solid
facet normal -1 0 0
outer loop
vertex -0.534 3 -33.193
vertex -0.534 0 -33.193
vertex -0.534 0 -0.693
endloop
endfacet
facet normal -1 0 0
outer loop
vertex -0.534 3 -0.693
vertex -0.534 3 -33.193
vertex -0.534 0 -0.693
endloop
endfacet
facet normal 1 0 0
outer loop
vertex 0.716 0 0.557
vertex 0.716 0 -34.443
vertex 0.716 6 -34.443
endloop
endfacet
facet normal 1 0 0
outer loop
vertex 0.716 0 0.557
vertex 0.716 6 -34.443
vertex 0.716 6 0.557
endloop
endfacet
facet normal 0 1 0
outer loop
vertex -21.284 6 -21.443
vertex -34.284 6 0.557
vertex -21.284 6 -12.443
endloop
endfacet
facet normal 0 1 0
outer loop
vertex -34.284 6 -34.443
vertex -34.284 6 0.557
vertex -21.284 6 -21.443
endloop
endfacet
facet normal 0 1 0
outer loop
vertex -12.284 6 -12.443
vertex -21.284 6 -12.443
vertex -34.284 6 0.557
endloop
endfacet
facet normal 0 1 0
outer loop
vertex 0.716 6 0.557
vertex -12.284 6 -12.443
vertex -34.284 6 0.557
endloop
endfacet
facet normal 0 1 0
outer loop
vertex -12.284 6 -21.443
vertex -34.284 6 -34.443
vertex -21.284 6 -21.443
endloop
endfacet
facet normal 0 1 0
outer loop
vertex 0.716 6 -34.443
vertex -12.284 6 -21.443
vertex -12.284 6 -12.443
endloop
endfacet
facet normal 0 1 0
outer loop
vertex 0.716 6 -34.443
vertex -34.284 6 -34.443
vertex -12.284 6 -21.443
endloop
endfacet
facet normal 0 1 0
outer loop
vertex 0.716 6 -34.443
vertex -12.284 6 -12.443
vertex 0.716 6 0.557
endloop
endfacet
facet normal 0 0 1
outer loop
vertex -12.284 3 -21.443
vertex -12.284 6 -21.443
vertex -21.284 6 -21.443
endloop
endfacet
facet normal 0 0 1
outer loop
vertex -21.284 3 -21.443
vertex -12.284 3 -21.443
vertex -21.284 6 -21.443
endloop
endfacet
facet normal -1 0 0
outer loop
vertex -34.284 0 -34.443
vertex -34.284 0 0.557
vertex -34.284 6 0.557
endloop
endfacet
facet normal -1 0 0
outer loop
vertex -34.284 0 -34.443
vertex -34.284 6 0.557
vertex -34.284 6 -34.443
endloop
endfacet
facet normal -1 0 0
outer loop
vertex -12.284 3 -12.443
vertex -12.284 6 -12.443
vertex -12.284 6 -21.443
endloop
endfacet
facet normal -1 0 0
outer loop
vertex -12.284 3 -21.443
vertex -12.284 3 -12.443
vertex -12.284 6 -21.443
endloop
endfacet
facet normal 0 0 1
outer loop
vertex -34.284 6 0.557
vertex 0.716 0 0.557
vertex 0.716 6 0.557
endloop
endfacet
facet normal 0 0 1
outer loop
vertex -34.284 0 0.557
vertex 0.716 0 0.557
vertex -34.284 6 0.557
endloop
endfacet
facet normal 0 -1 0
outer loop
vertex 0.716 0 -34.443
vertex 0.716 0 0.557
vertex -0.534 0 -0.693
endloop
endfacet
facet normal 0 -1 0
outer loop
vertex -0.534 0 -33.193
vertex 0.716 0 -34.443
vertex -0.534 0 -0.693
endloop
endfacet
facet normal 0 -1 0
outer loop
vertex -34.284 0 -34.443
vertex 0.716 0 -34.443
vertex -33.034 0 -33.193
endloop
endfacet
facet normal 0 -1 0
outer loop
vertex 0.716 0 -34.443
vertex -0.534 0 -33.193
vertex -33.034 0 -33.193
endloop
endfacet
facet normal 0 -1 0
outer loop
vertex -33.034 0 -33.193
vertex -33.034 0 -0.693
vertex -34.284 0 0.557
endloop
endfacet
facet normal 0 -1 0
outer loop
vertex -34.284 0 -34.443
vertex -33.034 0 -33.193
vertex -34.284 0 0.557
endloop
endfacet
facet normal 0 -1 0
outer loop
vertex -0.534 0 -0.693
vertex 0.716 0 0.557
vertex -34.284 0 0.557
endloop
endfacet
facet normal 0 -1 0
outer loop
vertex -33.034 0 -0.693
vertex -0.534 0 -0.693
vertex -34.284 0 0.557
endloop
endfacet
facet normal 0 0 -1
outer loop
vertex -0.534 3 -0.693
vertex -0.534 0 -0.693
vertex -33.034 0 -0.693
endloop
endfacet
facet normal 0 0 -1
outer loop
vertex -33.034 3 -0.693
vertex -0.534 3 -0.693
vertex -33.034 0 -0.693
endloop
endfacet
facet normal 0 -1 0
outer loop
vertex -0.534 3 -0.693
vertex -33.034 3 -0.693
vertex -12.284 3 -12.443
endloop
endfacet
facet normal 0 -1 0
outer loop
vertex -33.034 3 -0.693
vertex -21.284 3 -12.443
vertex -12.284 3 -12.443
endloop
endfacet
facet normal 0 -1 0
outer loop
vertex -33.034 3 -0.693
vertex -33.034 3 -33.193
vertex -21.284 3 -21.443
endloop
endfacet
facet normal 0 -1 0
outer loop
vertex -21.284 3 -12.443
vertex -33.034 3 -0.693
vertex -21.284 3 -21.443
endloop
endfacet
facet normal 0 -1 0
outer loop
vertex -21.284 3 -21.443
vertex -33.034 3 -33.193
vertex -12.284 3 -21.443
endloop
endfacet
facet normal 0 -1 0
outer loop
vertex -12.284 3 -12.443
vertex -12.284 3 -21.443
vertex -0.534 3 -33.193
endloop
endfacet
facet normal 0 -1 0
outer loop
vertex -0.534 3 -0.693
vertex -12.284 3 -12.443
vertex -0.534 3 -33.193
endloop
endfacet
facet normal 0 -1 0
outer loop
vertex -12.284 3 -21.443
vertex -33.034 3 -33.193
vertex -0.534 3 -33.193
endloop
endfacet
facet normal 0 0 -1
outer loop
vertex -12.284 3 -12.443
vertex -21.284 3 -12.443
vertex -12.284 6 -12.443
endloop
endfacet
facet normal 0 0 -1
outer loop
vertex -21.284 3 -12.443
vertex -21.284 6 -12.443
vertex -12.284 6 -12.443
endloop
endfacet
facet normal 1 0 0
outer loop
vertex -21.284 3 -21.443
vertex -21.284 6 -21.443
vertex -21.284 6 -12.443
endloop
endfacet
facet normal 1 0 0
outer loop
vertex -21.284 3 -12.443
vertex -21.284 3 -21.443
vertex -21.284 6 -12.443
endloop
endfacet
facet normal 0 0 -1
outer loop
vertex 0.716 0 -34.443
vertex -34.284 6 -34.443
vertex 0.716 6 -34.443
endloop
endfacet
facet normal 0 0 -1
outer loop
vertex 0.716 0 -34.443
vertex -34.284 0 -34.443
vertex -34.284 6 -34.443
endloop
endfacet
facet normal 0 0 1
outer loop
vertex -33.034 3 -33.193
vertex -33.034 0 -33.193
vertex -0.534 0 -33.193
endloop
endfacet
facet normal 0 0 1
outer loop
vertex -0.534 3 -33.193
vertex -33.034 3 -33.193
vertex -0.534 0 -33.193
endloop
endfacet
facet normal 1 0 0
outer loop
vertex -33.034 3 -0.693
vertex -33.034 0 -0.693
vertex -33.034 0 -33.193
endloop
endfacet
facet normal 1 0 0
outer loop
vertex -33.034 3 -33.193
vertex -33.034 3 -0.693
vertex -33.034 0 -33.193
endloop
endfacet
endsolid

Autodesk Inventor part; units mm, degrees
ref_plane "YZ Plane" through (0, 0, 0) normal (1, 0, 0) x (0, 1, 0)
ref_plane "XZ Plane" through (0, 0, 0) normal (0, 1, 0) x (-1, 0, 0)
ref_plane "XY Plane" through (0, 0, 0) normal (0, 0, 1) x (1, 0, 0)
sketch "Sketch1" plane through (0, 0, 0) normal (0, 1, 0) x (-1, 0, 0)
  line L0 (0.5335, -0.6929) -> (33.0335, -0.6929)
  line L1 (33.0335, -0.6929) -> (33.0335, -33.1929)
  line L2 (33.0335, -33.1929) -> (0.5335, -33.1929)
  line L3 (0.5335, -33.1929) -> (0.5335, -0.6929)
  line L4 (-0.7165, 0.5571) -> (34.2835, 0.5571)
  line L5 (34.2835, 0.5571) -> (34.2835, -34.4429)
  line L6 (34.2835, -34.4429) -> (-0.7165, -34.4429)
  line L7 (-0.7165, -34.4429) -> (-0.7165, 0.5571)
  point P0 (0, 0)
  dimension "d0" = 32.5
  dimension "d1" = 32.5
  dimension "d2" = 35
  dimension "d3" = 35
  dimension "d4" = 1.25
  dimension "d5" = 1.25
extrude "Extrusion1" add sketch "Sketch1" along normal blind 3
sketch "Sketch2" plane through (0, 3, 0) normal (0, 1, 0) x (1, 0, 0)
  line L0 (-34.2835, -0.5571) -> (0.7165, -0.5571) projected
  line L1 (0.7165, -0.5571) -> (0.7165, 34.4429) projected
  line L2 (-34.2835, -0.5571) -> (0.7165, -0.5571)
  line L3 (0.7165, -0.5571) -> (0.7165, 34.4429)
  line L4 (0.7165, 34.4429) -> (-34.2835, 34.4429)
  line L5 (-34.2835, 34.4429) -> (-34.2835, -0.5571)
  point P0 (0, 0)
extrude "Extrusion2" add sketch "Sketch2" along normal blind 3
sketch "Sketch3" plane through (0, 6, 0) normal (0, 1, 0) x (1, 0, 0)
  line L0 (-21.2835, 12.4429) -> (-12.2835, 12.4429)
  line L1 (-12.2835, 12.4429) -> (-12.2835, 21.4429)
  line L2 (-12.2835, 21.4429) -> (-21.2835, 21.4429)
  line L3 (-21.2835, 21.4429) -> (-21.2835, 12.4429)
  line L4 (-34.2835, 34.4429) -> (-34.2835, -0.5571) projected
  line L5 (0.7165, 34.4429) -> (-34.2835, 34.4429) projected
  point P0 (0, 0)
  dimension "d10" = 9
  dimension "d11" = 9
  dimension "d12" = 13
  dimension "d13" = 13
extrude "Extrusion3" cut sketch "Sketch3" against normal blind 3
properties part number "test_camera_seat"
